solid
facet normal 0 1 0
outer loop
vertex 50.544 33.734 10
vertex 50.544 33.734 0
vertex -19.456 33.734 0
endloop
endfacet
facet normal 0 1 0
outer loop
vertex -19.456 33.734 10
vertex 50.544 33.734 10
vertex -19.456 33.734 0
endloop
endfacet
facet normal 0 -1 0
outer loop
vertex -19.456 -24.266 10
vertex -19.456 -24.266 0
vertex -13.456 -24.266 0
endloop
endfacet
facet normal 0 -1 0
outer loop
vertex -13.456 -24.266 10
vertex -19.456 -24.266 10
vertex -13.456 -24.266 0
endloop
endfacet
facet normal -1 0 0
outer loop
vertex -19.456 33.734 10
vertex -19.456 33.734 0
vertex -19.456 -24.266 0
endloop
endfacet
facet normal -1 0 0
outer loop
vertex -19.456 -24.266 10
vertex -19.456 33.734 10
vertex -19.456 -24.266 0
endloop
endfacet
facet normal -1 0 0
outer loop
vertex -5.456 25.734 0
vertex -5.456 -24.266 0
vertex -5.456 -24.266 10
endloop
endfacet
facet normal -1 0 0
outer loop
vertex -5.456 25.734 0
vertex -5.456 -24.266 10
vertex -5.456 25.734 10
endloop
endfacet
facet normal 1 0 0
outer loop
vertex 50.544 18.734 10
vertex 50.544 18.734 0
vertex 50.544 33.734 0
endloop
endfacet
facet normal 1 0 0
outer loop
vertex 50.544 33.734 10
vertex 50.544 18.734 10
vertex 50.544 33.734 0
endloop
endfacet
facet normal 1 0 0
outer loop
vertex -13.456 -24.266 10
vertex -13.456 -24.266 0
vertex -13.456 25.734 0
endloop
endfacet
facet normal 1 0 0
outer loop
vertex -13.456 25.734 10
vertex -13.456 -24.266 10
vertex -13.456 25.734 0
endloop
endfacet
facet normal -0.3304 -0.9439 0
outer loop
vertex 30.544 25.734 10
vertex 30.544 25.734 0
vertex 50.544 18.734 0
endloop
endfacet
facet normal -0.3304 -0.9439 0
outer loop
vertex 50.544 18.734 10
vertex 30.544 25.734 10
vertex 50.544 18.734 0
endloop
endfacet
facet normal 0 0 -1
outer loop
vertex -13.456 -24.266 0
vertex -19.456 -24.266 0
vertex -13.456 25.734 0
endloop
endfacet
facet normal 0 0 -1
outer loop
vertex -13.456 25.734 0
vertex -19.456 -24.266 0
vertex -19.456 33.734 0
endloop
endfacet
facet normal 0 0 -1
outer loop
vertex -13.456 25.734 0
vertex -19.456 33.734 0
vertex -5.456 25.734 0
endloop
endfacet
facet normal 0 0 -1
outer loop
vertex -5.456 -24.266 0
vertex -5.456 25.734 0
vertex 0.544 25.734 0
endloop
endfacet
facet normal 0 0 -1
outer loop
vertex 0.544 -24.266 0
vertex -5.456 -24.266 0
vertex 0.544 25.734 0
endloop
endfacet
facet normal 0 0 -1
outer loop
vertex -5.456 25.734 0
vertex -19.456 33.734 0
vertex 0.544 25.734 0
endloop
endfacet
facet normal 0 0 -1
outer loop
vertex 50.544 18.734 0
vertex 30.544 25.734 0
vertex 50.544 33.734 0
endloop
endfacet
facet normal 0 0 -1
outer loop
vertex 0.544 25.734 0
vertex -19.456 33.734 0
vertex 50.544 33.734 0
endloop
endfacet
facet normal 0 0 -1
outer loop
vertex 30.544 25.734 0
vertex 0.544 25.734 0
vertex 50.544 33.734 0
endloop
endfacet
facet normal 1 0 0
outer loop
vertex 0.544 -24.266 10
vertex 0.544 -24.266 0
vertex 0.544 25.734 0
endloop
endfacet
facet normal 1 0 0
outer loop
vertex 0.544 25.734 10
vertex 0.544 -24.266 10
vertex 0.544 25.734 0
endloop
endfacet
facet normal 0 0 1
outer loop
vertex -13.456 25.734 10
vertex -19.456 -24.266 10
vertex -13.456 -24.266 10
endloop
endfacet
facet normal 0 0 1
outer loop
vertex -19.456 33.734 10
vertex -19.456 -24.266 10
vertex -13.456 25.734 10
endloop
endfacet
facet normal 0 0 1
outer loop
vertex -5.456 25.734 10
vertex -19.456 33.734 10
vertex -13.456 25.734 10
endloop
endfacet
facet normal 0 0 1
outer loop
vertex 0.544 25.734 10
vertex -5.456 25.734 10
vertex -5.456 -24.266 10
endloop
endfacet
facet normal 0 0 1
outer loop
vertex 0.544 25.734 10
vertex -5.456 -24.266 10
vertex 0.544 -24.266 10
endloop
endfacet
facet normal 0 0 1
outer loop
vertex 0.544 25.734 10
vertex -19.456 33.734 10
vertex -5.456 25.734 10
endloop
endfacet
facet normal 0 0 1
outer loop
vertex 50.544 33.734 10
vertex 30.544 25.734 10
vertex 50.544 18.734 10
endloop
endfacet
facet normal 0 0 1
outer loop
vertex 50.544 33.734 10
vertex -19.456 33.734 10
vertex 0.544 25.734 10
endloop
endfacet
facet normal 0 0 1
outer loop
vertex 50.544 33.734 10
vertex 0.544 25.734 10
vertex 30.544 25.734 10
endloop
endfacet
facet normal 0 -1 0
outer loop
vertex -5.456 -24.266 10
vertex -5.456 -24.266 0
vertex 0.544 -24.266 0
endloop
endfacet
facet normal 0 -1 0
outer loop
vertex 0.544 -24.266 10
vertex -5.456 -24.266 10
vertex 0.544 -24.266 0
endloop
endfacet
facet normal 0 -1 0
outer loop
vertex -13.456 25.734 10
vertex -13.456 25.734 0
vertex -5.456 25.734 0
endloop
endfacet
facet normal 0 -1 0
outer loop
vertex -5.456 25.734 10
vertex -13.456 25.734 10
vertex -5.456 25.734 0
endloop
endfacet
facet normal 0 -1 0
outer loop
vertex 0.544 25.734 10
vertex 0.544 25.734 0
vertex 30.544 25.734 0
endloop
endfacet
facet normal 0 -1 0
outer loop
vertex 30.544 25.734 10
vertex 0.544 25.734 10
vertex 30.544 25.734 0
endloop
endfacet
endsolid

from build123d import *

# Parameters (mm, degrees)
F0_W     = 6
F0_H     = 50
F1_DEPTH = 10


with BuildPart() as f1:
    # F0 (on Top) → F1 (new body)
    with BuildSketch(Plane.XY):
        Polygon((-19.455582, 33.734061), (-19.455582, 25.734061), (-13.455582, 25.734061), (-5.455582, 25.734061), (0.544418, 25.734061), (30.544418, 25.734061), (50.544418, 18.734061), (50.544418, 33.734061), align=None)
        with Locations((-16.455582, 0.734061)):
            Rectangle(F0_W, F0_H)
        with Locations((-2.455582, 0.734061)):
            Rectangle(F0_W, F0_H)
    extrude(amount=F1_DEPTH)


with BuildPart() as f2_1:
    # F2: copy of F1
    add(f1.part)


solid = f1.part
